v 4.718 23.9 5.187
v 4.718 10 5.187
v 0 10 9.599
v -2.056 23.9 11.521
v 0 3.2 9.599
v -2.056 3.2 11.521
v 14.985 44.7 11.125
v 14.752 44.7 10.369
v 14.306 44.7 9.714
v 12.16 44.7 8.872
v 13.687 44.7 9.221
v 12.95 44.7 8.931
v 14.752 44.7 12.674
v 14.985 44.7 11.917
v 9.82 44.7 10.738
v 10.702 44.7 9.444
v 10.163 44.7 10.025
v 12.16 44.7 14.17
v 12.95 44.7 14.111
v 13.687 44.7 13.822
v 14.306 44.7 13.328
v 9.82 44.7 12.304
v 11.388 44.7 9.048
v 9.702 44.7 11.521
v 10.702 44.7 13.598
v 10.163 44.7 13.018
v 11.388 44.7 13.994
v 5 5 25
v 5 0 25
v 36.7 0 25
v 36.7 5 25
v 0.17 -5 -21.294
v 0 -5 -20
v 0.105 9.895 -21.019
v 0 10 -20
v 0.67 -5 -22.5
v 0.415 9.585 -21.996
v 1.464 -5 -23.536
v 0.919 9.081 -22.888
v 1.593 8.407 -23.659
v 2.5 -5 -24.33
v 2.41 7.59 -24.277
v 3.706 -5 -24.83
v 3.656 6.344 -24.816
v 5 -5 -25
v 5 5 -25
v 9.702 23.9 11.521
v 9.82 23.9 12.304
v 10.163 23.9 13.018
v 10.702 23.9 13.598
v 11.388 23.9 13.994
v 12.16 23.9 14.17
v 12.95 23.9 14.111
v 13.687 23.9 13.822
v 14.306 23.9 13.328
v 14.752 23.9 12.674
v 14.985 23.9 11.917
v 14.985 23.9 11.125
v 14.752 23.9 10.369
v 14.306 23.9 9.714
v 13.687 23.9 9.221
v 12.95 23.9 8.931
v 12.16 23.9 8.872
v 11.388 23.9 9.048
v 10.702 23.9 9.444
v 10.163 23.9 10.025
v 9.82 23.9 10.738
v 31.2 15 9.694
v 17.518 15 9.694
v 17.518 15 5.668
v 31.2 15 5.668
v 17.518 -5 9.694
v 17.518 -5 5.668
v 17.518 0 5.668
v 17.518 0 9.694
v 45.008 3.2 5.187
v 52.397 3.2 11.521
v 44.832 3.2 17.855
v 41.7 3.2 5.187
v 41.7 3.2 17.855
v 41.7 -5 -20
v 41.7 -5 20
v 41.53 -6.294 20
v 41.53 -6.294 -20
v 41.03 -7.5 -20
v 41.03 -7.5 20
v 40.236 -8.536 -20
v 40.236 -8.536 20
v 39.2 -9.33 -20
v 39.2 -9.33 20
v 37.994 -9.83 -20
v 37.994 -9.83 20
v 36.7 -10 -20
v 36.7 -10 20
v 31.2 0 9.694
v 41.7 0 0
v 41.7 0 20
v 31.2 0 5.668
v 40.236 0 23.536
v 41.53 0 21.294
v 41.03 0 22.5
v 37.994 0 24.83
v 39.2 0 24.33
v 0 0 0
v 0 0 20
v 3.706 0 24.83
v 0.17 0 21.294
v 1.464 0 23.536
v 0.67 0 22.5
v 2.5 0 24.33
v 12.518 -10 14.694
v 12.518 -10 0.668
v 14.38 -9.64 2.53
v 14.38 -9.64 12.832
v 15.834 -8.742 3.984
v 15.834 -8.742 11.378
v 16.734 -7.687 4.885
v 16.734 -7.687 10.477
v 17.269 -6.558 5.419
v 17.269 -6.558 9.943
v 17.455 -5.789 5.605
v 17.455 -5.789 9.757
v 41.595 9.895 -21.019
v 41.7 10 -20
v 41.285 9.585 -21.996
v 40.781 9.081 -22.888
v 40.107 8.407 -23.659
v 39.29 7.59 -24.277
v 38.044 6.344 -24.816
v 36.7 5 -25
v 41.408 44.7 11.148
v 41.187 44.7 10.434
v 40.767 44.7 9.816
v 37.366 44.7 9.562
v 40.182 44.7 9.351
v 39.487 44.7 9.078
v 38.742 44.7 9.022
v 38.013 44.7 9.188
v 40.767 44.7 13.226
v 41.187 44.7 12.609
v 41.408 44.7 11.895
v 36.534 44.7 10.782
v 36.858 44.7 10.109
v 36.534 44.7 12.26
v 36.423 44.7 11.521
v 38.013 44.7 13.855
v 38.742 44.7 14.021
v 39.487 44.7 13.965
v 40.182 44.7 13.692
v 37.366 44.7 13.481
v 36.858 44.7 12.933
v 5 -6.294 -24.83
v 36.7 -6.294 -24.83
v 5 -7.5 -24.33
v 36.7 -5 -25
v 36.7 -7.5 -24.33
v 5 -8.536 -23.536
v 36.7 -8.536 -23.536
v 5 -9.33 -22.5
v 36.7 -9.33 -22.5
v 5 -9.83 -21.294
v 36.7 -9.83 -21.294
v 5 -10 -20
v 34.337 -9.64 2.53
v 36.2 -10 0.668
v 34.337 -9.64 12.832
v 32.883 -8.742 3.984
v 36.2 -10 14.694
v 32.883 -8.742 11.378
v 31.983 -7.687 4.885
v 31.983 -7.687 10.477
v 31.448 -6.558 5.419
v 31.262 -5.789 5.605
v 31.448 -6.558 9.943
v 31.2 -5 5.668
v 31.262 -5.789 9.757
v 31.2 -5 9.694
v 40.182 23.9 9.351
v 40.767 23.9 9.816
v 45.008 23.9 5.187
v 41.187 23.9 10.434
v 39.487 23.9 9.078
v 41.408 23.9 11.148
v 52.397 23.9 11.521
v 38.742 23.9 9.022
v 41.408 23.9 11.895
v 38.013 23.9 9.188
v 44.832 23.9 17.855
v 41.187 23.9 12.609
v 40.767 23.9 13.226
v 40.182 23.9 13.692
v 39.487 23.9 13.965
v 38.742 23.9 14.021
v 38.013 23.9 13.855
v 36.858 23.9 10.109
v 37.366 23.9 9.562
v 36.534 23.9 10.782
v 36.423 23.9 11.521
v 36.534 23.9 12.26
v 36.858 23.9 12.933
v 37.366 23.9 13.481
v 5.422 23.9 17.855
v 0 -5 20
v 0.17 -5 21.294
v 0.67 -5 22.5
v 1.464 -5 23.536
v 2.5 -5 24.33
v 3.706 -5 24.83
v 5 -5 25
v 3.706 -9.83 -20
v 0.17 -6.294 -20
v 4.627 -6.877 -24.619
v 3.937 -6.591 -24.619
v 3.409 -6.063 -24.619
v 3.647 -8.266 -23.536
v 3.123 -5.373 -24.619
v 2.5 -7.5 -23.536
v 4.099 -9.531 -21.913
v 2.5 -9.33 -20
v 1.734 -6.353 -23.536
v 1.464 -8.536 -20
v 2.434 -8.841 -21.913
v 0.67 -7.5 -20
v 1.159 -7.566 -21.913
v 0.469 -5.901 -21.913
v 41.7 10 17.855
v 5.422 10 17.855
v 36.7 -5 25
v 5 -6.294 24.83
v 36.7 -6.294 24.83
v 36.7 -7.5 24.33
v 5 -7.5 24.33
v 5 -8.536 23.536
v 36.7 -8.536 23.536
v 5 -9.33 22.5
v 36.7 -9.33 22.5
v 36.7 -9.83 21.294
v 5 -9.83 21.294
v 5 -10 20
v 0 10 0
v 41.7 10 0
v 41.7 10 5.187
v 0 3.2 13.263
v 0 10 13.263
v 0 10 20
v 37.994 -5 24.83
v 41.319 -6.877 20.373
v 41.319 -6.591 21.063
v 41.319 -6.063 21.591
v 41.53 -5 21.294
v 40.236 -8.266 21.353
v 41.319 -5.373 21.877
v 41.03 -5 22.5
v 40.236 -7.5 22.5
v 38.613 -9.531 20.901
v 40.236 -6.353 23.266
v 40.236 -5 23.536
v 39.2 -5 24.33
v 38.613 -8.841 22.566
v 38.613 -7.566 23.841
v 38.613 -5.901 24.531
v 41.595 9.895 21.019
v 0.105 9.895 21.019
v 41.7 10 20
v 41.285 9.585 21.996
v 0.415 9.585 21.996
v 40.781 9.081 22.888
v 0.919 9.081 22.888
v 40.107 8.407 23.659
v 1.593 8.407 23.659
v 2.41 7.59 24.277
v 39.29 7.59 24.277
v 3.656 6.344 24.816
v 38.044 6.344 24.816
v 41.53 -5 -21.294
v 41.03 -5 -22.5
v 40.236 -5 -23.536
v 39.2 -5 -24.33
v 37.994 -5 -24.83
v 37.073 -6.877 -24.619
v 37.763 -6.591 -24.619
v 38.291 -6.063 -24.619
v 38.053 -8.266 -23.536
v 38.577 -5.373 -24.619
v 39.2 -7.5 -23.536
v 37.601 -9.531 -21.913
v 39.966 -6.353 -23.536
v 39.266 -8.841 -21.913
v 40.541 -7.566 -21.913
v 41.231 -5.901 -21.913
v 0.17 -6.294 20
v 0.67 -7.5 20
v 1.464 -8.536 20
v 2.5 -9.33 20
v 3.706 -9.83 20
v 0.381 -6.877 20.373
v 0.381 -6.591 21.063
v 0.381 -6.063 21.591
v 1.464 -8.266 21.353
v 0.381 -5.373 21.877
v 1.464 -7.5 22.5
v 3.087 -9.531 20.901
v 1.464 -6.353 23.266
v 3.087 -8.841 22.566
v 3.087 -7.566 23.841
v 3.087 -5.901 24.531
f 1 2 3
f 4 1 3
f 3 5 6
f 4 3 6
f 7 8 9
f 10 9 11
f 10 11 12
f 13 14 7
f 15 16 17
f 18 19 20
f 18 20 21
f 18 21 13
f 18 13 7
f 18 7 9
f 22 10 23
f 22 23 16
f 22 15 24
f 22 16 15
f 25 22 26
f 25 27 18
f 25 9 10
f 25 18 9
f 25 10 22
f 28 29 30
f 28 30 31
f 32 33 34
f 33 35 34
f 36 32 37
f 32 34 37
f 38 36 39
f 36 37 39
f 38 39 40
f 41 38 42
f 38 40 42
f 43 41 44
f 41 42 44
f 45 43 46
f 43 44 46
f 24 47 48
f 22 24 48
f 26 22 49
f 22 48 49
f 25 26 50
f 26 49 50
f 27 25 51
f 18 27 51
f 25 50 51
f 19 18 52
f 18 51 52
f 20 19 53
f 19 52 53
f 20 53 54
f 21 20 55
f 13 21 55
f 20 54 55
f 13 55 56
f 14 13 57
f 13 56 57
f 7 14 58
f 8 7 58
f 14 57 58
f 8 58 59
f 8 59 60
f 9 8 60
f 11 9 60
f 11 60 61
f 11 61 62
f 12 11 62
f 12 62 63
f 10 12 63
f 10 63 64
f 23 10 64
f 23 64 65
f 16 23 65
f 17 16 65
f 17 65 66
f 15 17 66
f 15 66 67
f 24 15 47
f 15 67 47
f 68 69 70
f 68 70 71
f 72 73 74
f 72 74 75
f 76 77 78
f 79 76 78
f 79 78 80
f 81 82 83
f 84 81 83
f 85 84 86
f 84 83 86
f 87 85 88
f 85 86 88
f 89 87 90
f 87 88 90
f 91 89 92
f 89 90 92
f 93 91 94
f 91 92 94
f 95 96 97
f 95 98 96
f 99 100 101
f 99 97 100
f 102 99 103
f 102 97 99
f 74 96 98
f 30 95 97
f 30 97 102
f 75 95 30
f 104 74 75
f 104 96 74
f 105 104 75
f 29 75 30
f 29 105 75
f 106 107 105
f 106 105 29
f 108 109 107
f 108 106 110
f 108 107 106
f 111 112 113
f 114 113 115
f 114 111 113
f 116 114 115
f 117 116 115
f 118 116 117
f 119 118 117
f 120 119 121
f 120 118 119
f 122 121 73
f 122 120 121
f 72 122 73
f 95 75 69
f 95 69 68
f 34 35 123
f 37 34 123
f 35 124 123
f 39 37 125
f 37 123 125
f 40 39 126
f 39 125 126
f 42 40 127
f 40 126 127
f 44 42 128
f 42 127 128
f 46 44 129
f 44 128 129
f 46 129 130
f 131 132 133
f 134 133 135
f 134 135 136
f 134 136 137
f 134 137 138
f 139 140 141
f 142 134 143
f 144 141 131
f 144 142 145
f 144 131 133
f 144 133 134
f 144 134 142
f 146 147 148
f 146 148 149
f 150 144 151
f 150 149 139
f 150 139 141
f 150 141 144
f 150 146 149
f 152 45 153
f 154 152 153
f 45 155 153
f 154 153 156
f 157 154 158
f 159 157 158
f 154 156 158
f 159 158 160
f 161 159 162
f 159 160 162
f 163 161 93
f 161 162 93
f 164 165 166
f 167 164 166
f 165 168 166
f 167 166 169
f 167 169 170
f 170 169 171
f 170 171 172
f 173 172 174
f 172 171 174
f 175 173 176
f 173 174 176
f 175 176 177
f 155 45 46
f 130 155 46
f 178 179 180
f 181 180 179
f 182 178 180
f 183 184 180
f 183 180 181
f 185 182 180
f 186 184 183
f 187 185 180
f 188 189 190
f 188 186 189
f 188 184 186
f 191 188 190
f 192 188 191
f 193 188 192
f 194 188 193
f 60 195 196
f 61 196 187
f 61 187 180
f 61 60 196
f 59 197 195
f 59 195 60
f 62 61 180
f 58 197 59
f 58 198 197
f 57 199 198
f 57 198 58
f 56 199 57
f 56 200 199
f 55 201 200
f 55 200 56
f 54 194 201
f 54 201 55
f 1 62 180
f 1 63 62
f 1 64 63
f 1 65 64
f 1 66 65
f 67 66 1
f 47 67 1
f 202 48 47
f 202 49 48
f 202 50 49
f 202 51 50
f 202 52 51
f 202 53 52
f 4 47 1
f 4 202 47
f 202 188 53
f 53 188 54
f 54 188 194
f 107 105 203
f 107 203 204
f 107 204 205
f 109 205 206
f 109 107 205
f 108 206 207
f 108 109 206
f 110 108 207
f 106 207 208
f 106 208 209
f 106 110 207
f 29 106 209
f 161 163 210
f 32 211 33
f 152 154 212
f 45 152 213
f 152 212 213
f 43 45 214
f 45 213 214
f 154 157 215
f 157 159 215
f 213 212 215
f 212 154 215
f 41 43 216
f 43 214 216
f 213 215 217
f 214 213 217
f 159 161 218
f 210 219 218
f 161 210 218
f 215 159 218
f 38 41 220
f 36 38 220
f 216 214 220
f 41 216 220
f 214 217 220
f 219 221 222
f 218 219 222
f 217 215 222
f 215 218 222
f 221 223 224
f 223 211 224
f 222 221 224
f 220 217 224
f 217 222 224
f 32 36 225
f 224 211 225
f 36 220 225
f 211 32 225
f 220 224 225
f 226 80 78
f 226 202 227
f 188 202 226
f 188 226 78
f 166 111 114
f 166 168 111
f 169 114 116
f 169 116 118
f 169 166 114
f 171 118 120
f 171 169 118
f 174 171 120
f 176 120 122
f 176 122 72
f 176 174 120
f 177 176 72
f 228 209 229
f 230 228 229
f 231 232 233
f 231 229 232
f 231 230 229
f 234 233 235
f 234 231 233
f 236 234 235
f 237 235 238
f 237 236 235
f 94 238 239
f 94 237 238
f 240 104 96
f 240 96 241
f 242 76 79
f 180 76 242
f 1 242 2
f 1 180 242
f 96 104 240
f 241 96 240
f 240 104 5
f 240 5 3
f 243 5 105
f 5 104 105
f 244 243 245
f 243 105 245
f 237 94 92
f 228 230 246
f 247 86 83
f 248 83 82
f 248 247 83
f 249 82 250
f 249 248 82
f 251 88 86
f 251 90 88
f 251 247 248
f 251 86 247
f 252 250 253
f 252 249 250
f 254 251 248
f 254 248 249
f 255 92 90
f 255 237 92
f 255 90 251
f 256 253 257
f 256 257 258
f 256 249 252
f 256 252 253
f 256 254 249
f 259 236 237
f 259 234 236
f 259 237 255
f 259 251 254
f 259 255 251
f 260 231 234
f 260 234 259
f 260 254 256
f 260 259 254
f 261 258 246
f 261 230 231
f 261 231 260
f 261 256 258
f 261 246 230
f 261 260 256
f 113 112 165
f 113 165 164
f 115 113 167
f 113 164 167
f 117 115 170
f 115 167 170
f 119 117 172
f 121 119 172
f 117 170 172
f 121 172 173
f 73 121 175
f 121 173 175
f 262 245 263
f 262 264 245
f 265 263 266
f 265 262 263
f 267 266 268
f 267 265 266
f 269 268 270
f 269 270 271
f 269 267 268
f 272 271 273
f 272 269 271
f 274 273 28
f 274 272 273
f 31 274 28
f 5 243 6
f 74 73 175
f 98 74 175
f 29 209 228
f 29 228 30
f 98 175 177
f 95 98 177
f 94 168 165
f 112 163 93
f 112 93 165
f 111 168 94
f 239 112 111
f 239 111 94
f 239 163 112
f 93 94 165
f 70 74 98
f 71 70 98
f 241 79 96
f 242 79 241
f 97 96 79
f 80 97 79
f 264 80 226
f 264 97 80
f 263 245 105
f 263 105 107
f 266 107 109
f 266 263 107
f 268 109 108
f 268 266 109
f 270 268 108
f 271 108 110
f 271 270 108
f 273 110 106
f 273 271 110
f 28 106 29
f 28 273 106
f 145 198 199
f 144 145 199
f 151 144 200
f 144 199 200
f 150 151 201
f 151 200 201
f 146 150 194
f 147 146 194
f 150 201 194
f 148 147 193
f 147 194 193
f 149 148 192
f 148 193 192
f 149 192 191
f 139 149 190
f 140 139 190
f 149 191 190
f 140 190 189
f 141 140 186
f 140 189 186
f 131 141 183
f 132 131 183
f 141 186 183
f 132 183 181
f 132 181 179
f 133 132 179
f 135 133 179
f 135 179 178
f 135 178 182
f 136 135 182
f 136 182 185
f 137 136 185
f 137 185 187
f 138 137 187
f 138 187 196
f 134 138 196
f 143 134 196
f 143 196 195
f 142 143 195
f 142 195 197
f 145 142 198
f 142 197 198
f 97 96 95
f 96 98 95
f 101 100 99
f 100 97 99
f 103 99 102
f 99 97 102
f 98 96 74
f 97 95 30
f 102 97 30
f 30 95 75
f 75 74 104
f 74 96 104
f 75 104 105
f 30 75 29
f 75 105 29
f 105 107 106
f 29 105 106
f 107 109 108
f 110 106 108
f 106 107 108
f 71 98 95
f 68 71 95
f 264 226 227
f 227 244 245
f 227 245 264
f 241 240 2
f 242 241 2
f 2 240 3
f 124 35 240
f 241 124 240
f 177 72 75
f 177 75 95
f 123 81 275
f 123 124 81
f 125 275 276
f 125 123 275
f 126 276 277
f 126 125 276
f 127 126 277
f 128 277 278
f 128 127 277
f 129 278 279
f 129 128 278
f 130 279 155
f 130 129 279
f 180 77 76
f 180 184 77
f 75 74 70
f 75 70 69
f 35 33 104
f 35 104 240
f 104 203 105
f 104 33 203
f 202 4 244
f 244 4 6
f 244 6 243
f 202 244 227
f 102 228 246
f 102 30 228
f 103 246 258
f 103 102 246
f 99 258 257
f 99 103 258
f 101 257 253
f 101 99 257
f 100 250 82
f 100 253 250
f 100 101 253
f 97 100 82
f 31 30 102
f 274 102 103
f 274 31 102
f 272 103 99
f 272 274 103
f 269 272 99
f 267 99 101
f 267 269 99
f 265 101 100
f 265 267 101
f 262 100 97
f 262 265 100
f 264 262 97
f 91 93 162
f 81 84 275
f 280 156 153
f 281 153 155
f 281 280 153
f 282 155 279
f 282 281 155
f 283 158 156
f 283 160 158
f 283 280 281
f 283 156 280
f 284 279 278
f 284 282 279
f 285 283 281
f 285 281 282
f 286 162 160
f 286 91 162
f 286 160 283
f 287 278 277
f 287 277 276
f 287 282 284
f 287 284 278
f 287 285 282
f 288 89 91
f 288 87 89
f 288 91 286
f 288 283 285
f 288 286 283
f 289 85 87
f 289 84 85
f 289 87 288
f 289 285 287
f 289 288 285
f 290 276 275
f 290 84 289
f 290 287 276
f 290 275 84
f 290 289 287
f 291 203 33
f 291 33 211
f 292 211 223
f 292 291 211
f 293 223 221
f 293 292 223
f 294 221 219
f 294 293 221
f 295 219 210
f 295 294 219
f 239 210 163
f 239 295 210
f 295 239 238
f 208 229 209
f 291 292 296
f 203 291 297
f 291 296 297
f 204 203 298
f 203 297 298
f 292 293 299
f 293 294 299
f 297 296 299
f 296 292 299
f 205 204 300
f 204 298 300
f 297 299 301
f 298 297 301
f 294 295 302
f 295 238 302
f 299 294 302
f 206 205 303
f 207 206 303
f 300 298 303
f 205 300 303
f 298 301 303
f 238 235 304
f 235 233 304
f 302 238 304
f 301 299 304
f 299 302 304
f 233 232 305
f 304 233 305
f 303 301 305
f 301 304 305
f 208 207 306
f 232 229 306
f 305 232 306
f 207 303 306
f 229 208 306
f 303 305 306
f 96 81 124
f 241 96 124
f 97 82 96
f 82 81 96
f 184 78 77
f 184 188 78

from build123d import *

# Parameters (mm, degrees)
F0_W           = 20
F0_H           = 50
F1_DEPTH       = 41.7
F3_DEPTH       = 13.9
F4_R           = 2.5065170682
F4_R_2         = 2.6565004192
F5_DEPTH       = 20.8
F6_W           = 13.6819668114
F6_H           = 4.0263775736
F7_DEPTH       = 25
F8_R           = 5
F9_DEPTH       = 6.8
F10_W          = 89.1183391213
F10_H          = 31.738139689
F11_DEPTH      = 102.9
F11_DEPTH_BACK = 95.7


with BuildPart() as f1:
    # F0 (on Right) → F1 (new body)
    with BuildSketch(Plane.YZ):
        Rectangle(F0_W, F0_H)
    extrude(amount=F1_DEPTH)

    # F2 (on face) → F3 (join)
    with BuildSketch(Plane(origin=(0, 10, 0), x_dir=(-1, 0, 0), z_dir=(0, 1, 0))):
        Polygon((2.0557455719, 11.5212770179), (-5.4216566496, 17.8550779819), (-44.8319688439, 17.8550779819), (-52.3973405361, 11.5212770179), (-45.0079068542, 5.1874779165), (-4.7179018147, 5.1874779165), align=None)
    extrude(amount=F3_DEPTH)

    # F4 (on face) → F5 (join)
    with BuildSketch(Plane(origin=(0, 23.9, 0), x_dir=(-1, 0, 0), z_dir=(0, 1, 0))):
        with Locations((-38.9291346073, 11.5212770179)):
            Circle(F4_R)
        with Locations((-12.3583860695, 11.5212770179)):
            Circle(F4_R_2)
    extrude(amount=F5_DEPTH)

    # F6 (on face) → F7 (cut)
    with BuildSketch(Plane.XZ.offset(10)):
        with Locations((24.3585463613, 7.6809162274)):
            Rectangle(F6_W, F6_H)
    extrude(amount=-F7_DEPTH, mode=Mode.SUBTRACT)

    # F8
    f8_edges = [f1.edges().sort_by_distance(p)[0] for p in [
        (20.85, -10, 25),
        (0, -10, 0),
        (41.7, -10, 0),
        (20.85, -10, -25),
        (24.358546, -10, 5.667727),
        (17.517563, -10, 7.680916),
        (24.358546, -10, 9.694105),
        (31.19953, -10, 7.680916),
        (20.85, 10, -25),
        (0, 0, -25),
        (41.7, 0, -25),
        (20.85, 10, 25),
        (0, 0, 25),
        (41.7, 0, 25),
    ]]
    fillet(f8_edges, radius=F8_R)

    # F9 (add): faces of the model
    f9_faces = [f1.faces().sort_by_distance(p)[0] for p in [
        (45.5142899313, 10, 11.4945877897),
        (-0.685248524, 10, 11.4609711979),
    ]]
    extrude(f9_faces, amount=F9_DEPTH)


with BuildPart() as f11:
    # F10 (on face) → F11 (new body, two sides)
    with BuildSketch(Plane.YZ.offset(41.7)) as f11_sk:
        with Locations((44.5591695607, 15.8690698445)):
            Rectangle(F10_W, F10_H)
    extrude(amount=-F11_DEPTH)
    extrude(f11_sk.sketch, amount=F11_DEPTH_BACK)


with BuildPart() as f12_1:
    # F12: copy of F11
    add(f11.part)


with BuildPart() as f13_1:
    # F13: copy of F1
    add(f1.part)

    # F15: intersect F12_1
    add(f12_1.part, mode=Mode.INTERSECT)


with BuildPart() as f1_1:
    add(f1.part)

    # F14: cut F11
    add(f11.part, mode=Mode.SUBTRACT)


solid = Compound([f13_1.part, f1_1.part])
